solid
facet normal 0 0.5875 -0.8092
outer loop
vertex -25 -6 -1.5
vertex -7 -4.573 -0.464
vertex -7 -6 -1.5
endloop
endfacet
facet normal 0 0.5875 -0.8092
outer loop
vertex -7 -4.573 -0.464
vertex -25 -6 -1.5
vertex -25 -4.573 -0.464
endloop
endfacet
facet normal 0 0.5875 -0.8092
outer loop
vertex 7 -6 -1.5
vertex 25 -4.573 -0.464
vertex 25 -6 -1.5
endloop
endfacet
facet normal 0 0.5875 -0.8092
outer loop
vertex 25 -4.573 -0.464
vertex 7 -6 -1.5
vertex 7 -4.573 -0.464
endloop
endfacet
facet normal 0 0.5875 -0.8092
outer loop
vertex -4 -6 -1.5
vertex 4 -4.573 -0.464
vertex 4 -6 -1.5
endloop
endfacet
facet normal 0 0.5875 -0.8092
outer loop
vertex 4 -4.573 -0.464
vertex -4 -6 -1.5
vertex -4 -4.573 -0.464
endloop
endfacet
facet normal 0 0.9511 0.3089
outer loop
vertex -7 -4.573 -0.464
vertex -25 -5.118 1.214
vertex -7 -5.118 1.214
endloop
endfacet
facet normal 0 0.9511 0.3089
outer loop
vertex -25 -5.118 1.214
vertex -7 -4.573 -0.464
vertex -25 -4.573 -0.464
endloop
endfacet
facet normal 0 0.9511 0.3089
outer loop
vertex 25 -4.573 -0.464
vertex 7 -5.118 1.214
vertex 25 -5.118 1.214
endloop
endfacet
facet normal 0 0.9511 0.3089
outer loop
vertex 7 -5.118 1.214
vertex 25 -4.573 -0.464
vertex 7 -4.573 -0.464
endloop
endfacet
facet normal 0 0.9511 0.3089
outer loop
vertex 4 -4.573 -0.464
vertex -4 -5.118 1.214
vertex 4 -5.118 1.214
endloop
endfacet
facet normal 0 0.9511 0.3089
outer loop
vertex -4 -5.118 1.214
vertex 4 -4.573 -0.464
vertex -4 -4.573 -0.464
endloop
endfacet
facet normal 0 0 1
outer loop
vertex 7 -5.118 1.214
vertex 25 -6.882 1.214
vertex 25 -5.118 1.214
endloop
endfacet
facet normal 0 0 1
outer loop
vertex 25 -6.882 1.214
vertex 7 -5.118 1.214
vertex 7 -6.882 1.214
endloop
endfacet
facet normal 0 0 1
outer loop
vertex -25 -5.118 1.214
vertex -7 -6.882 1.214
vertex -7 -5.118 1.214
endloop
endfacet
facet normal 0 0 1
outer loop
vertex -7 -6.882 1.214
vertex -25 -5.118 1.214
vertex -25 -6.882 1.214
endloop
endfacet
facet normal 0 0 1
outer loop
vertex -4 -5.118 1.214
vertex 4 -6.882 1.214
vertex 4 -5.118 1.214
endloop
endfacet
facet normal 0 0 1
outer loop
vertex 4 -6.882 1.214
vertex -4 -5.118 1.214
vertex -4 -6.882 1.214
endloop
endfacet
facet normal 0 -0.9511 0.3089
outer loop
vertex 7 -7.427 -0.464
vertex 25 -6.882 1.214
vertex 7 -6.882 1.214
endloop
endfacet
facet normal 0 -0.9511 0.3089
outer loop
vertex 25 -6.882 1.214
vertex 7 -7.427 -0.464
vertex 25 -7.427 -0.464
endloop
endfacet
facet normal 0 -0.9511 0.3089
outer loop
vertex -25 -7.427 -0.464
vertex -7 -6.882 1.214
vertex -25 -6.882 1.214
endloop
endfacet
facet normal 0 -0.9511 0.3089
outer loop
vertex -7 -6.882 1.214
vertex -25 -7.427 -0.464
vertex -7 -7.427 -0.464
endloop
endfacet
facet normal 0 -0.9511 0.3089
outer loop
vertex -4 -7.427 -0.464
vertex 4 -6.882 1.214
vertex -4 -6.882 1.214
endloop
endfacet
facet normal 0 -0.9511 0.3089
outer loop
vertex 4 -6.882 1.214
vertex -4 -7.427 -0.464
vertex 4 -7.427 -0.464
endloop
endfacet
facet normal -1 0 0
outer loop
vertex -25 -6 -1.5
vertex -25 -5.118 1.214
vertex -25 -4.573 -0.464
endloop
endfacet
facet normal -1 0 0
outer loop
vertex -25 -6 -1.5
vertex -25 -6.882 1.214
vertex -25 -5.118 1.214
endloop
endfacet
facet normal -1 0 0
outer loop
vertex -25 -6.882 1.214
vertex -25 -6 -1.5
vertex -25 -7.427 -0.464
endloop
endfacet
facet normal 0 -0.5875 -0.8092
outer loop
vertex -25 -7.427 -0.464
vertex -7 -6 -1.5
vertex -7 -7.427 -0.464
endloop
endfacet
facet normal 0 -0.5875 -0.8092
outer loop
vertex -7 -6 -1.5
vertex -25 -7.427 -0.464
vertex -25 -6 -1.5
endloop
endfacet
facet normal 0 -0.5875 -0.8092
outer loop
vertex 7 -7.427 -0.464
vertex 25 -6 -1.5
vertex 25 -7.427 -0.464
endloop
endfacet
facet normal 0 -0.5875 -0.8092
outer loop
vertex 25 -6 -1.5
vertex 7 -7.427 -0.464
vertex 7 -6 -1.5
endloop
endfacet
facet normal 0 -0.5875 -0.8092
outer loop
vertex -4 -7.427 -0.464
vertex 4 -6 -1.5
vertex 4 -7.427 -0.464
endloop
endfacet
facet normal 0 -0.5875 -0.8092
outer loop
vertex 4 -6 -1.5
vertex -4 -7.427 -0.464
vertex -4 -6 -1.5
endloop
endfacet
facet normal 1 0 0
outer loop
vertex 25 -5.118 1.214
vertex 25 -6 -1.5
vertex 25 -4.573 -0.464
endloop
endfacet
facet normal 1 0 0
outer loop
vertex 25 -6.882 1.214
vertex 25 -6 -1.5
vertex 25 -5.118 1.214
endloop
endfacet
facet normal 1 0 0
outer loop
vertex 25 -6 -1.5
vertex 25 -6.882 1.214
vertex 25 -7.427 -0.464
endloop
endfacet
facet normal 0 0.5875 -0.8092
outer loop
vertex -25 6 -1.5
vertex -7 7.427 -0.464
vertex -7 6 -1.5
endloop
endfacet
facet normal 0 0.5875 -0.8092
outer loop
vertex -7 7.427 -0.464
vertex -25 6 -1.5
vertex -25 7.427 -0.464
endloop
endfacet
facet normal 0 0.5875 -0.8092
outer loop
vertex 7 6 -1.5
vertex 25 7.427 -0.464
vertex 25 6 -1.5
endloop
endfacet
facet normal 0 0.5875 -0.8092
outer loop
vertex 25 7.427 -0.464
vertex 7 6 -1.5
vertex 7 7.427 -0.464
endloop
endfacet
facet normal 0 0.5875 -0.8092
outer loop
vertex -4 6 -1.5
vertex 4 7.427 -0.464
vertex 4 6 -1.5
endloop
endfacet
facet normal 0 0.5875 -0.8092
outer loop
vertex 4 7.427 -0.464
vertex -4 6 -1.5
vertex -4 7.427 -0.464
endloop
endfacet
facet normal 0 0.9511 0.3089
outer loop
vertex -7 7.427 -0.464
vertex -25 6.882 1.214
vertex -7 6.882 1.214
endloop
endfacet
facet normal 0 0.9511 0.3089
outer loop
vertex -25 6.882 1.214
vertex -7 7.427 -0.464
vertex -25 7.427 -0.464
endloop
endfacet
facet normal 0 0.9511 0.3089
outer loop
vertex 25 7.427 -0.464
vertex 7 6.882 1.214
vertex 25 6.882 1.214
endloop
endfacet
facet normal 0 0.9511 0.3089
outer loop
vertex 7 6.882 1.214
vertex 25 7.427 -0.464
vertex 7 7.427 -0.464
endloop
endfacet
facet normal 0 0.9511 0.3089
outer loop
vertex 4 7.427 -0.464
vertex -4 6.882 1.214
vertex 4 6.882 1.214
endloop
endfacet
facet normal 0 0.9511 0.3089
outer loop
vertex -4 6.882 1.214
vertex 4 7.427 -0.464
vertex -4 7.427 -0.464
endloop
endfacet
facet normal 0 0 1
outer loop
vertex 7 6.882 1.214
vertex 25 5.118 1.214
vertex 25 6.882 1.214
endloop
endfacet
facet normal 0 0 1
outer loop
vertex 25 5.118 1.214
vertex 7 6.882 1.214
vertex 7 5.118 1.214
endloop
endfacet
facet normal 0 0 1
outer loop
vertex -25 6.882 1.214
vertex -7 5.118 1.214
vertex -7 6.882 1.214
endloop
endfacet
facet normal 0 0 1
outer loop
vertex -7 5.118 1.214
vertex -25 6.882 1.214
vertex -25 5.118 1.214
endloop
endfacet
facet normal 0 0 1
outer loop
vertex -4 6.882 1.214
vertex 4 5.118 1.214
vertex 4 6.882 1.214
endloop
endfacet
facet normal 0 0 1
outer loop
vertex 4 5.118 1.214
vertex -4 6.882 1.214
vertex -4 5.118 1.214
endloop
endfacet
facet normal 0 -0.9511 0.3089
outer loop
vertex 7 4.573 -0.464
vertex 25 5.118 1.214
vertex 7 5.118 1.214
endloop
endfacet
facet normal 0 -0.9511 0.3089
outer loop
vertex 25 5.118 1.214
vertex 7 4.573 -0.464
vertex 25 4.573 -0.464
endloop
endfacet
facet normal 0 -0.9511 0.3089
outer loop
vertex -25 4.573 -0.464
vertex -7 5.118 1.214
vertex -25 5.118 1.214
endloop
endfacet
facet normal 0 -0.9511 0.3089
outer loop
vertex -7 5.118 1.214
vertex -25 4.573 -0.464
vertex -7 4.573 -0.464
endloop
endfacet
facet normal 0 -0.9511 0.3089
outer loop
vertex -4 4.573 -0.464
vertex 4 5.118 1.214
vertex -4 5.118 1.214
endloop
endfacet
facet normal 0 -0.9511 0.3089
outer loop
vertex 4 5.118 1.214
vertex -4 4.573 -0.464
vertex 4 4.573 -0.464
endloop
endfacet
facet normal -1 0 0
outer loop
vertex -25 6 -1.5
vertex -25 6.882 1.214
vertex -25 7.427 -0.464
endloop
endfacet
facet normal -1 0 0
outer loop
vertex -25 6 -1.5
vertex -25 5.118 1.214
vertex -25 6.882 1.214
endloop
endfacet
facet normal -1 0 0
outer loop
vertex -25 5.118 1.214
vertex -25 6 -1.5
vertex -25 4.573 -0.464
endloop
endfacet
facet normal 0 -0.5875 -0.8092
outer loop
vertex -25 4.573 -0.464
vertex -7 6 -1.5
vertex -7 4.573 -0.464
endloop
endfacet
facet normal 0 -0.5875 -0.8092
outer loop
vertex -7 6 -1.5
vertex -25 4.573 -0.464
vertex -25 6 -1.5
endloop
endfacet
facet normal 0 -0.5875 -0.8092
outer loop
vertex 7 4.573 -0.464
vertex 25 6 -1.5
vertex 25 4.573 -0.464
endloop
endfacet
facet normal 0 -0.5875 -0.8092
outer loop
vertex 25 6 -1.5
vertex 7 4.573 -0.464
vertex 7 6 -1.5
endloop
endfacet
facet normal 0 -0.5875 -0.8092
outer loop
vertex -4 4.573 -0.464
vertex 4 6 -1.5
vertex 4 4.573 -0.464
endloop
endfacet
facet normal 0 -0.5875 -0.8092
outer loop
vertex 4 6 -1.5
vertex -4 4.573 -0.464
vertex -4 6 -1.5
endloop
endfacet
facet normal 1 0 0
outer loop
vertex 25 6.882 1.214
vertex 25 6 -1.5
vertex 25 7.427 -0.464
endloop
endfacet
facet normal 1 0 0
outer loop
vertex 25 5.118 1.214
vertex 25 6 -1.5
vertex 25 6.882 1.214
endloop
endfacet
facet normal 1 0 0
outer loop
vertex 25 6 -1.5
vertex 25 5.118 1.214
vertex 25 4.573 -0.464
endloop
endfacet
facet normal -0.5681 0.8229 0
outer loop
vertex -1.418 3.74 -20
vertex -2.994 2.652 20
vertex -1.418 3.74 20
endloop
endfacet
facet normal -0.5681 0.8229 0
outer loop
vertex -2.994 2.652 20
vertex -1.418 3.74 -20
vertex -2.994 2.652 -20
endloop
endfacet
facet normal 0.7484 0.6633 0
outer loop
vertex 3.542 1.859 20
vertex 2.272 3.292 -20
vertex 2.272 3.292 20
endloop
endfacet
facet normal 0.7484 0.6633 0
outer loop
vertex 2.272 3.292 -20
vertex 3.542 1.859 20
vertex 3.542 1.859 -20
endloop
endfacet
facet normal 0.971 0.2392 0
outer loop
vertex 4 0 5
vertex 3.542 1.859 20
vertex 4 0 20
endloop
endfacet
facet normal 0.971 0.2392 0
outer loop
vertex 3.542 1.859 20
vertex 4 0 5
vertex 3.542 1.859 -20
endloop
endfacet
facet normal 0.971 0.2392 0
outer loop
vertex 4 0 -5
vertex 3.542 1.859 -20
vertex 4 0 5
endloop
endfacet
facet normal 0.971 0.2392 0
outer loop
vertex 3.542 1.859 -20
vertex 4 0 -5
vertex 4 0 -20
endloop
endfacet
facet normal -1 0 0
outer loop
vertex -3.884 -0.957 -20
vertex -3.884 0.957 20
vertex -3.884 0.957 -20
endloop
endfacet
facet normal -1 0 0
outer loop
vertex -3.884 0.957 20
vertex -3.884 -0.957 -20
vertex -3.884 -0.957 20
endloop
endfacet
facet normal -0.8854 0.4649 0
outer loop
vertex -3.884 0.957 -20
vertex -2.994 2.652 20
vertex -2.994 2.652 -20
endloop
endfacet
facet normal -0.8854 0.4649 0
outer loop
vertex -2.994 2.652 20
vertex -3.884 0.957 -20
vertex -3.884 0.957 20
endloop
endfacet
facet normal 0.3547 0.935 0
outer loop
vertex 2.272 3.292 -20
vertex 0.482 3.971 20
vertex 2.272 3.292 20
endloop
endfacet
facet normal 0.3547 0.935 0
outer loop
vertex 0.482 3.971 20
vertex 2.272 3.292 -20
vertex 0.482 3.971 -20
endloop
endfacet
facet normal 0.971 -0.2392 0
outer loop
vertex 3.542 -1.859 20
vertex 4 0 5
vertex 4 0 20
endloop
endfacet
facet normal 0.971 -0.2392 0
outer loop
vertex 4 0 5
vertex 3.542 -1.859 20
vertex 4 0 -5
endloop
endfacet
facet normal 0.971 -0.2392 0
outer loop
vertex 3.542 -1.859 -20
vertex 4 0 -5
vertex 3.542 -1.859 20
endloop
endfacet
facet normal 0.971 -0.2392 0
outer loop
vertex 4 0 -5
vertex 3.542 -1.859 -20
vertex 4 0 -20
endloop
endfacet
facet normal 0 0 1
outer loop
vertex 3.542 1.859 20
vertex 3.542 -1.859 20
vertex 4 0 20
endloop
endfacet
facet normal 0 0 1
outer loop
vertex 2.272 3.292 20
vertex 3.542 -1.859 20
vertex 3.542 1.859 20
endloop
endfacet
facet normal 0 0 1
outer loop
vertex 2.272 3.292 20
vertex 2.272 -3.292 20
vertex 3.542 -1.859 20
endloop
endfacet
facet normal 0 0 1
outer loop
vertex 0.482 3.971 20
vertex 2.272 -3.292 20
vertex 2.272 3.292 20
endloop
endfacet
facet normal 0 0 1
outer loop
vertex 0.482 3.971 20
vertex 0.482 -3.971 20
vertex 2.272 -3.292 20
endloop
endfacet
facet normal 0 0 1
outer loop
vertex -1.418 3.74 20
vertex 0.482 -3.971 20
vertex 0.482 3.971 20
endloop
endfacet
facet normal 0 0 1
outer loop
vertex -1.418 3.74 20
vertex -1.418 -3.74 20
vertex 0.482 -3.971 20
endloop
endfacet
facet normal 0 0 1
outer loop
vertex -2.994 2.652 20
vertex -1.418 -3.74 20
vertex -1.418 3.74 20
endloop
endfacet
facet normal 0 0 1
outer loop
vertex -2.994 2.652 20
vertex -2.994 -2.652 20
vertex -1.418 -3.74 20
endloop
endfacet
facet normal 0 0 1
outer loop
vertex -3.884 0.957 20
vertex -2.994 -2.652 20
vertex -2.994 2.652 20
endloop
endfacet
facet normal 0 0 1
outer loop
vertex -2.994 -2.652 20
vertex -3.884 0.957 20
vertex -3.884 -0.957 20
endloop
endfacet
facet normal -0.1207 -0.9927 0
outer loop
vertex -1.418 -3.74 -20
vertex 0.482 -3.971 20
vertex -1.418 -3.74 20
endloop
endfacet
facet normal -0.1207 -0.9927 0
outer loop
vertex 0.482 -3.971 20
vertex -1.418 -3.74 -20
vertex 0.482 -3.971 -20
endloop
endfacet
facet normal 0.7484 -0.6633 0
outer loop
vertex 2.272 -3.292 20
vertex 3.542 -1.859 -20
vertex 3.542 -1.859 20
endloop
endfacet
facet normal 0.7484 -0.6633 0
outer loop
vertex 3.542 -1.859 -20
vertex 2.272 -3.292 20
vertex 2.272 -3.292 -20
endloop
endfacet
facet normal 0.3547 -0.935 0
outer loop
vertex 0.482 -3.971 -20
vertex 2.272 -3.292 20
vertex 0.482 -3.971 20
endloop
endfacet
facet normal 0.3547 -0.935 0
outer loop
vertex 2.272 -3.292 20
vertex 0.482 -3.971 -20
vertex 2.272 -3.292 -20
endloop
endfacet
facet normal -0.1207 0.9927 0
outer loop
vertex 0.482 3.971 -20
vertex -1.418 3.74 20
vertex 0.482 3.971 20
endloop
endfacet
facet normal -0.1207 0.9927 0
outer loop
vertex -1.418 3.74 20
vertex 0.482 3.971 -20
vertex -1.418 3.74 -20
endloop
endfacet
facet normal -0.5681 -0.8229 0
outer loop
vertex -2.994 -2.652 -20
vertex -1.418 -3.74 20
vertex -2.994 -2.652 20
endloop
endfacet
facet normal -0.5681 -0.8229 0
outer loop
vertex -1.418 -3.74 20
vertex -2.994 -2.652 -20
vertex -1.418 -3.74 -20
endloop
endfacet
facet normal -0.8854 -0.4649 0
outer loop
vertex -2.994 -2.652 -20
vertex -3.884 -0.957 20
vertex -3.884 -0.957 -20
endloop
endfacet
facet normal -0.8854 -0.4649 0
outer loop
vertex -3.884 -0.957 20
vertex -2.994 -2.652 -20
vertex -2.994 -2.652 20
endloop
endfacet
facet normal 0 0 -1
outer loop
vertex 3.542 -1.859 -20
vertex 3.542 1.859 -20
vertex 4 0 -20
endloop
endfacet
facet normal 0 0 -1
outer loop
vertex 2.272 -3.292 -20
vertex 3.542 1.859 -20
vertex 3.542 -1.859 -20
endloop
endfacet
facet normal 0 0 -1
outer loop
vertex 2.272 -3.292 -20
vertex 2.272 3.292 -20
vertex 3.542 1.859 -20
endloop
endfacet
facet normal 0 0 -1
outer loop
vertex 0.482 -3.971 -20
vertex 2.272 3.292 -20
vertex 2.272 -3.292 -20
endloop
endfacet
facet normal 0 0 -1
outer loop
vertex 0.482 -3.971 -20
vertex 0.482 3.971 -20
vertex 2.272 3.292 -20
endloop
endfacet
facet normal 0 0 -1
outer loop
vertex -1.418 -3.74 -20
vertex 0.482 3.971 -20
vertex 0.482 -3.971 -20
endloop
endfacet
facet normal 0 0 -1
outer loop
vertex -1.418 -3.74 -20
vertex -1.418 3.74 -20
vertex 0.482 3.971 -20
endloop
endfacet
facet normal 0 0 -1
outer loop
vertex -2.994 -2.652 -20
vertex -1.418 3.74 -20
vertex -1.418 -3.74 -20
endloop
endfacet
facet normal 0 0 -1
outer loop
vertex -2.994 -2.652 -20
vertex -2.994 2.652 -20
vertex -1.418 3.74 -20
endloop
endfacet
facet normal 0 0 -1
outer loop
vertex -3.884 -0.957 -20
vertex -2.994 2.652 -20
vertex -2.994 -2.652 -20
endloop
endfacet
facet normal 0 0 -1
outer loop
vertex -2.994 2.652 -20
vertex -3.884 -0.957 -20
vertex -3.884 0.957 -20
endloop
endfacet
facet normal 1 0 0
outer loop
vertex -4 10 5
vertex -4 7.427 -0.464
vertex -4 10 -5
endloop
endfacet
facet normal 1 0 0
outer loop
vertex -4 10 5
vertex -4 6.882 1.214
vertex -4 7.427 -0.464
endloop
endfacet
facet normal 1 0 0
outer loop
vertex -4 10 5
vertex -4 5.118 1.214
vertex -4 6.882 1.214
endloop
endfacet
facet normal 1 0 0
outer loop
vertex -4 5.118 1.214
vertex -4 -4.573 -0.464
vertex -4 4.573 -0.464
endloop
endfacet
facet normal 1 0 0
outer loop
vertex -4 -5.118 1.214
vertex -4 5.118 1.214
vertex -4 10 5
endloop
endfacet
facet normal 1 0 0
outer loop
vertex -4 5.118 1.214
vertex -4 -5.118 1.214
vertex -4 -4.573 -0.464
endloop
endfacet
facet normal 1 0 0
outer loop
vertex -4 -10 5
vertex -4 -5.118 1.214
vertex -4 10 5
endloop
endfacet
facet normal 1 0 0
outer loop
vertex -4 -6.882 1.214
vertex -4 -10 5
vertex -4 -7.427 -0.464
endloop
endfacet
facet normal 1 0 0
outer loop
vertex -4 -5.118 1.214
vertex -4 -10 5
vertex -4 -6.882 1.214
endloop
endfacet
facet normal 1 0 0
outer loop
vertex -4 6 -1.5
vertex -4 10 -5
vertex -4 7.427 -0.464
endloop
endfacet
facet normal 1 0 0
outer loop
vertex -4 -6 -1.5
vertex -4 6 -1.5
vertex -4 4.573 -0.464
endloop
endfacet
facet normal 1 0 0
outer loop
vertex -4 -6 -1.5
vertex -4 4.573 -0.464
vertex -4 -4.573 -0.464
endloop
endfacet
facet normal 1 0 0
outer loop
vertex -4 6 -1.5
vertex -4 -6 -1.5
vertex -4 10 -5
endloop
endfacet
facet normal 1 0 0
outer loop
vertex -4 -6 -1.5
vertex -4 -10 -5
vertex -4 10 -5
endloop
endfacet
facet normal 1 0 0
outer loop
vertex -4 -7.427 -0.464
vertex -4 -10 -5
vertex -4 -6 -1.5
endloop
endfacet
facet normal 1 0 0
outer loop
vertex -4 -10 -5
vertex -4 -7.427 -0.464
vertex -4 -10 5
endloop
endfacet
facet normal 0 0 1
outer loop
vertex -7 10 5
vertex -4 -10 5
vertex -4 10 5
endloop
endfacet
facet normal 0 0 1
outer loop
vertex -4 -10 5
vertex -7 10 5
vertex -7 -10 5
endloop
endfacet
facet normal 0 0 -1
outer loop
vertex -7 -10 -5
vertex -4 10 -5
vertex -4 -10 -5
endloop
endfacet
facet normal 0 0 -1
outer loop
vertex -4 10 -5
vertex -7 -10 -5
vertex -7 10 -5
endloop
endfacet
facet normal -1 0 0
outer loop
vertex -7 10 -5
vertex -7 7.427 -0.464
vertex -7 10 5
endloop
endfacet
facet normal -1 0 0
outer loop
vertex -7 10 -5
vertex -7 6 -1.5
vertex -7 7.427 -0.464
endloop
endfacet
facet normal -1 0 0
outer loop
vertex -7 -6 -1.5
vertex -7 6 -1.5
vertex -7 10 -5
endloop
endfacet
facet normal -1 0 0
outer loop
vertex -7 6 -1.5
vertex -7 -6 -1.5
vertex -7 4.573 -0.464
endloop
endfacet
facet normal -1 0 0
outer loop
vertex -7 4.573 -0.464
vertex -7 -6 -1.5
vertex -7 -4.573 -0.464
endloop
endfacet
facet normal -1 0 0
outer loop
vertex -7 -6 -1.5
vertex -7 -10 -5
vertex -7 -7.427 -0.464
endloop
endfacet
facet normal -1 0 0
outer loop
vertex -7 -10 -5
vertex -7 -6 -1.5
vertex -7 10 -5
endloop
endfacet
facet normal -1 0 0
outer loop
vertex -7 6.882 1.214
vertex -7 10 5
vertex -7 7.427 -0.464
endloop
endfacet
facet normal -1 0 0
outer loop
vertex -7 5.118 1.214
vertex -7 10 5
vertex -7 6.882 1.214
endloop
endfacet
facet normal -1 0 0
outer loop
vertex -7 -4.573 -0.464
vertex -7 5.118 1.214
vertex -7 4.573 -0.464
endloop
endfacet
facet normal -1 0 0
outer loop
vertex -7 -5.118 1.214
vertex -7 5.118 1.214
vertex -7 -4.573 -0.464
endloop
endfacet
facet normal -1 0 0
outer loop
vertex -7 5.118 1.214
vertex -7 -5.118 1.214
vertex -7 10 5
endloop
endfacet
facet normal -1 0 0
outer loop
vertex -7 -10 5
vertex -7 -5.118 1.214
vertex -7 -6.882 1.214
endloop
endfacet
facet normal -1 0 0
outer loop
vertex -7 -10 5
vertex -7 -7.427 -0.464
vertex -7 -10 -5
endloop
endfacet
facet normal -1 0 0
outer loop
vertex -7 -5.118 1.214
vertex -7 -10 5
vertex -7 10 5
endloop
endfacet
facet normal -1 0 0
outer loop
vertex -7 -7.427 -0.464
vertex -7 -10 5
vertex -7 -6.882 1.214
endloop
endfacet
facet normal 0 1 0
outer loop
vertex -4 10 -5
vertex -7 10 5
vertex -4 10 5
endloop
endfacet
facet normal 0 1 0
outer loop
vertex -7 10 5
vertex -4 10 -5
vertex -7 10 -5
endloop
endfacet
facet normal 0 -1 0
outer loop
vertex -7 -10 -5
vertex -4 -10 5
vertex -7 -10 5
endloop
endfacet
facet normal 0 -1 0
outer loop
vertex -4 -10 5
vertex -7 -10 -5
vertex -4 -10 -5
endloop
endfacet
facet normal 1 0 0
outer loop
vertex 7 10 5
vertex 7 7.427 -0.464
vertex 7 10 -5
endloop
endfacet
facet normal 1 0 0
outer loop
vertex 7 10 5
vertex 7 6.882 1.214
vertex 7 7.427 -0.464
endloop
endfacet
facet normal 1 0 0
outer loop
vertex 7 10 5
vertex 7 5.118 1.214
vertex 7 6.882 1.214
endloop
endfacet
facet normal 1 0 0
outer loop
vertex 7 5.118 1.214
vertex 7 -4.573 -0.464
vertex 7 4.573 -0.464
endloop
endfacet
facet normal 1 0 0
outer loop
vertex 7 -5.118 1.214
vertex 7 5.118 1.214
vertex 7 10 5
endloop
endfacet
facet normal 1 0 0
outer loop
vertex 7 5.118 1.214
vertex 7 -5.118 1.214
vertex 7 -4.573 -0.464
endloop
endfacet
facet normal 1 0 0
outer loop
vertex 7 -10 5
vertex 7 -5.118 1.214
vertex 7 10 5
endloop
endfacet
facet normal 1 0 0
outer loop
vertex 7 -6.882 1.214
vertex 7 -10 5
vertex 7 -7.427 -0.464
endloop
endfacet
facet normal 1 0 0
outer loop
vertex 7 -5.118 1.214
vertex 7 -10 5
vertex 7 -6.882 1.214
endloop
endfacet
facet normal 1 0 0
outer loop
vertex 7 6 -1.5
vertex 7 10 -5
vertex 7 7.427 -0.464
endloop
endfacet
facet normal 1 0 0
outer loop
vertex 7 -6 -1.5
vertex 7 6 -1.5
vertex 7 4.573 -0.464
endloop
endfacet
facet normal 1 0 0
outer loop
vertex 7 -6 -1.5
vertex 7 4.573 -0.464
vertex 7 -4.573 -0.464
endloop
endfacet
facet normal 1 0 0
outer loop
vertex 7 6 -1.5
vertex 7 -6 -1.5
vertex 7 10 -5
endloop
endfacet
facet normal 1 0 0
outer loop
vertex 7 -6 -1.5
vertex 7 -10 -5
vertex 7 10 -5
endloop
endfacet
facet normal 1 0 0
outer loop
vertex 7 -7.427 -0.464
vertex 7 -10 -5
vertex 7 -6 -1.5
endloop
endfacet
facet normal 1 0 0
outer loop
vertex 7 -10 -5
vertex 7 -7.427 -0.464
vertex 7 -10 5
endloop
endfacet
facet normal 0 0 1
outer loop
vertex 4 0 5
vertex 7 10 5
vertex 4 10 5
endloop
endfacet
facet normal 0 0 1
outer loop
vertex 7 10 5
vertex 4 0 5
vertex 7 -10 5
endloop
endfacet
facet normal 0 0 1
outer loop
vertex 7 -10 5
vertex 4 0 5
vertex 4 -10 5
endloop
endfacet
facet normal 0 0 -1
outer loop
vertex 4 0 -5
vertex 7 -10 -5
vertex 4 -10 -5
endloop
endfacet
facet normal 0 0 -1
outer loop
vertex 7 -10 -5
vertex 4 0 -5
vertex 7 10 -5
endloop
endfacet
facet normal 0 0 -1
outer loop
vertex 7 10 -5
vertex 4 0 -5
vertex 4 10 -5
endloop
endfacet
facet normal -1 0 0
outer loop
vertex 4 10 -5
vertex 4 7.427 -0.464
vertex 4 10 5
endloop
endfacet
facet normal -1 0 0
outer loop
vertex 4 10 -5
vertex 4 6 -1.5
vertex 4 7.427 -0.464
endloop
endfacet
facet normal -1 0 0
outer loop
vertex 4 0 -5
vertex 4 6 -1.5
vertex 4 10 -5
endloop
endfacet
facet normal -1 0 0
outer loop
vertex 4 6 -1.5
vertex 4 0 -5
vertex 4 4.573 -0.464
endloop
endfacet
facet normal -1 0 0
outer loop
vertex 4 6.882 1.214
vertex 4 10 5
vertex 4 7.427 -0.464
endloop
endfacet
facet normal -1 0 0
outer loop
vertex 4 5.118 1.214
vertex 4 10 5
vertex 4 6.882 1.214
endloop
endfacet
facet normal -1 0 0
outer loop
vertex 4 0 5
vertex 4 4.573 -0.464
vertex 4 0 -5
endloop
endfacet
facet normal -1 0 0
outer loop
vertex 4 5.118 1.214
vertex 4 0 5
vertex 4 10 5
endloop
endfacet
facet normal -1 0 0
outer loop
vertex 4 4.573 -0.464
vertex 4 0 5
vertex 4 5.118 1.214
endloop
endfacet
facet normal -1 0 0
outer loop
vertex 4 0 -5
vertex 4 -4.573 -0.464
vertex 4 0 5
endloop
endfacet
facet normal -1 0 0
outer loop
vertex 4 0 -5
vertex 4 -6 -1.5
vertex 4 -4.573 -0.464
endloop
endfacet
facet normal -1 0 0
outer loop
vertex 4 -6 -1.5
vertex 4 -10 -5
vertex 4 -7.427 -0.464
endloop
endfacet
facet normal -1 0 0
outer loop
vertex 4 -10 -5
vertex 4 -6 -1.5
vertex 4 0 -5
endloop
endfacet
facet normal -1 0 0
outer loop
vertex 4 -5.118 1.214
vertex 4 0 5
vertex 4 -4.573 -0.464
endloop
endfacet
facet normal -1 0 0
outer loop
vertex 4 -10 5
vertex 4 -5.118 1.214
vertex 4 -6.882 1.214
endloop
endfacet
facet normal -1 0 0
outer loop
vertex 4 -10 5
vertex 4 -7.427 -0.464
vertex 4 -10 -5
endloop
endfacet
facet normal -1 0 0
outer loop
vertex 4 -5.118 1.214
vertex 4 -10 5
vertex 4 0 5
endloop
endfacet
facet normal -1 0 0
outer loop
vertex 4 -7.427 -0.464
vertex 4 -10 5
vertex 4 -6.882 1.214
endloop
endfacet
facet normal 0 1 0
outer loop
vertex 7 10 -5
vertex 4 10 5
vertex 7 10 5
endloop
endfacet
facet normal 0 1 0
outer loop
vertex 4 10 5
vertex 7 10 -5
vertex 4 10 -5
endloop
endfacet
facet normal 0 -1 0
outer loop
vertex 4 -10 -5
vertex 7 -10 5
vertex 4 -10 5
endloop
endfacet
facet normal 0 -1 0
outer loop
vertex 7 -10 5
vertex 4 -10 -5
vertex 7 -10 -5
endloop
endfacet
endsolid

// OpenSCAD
module fred(){
difference(){
cube([50,20,10]);
translate([5,5,-1])cube([12,12,50]);
translate([22,5,-1])cube([12,12,50]);
}
}


cylinder(d=8,h=40,center=true);
for (i=[-1,1]){
translate([0,i*6,0])rotate([0,90,0])cylinder(d=3,h=50,center=true);
}
translate([-4-1.5,0,])cube([3,20,10],center=true);
translate([4+1.5,0,])cube([3,20,10],center=true);
